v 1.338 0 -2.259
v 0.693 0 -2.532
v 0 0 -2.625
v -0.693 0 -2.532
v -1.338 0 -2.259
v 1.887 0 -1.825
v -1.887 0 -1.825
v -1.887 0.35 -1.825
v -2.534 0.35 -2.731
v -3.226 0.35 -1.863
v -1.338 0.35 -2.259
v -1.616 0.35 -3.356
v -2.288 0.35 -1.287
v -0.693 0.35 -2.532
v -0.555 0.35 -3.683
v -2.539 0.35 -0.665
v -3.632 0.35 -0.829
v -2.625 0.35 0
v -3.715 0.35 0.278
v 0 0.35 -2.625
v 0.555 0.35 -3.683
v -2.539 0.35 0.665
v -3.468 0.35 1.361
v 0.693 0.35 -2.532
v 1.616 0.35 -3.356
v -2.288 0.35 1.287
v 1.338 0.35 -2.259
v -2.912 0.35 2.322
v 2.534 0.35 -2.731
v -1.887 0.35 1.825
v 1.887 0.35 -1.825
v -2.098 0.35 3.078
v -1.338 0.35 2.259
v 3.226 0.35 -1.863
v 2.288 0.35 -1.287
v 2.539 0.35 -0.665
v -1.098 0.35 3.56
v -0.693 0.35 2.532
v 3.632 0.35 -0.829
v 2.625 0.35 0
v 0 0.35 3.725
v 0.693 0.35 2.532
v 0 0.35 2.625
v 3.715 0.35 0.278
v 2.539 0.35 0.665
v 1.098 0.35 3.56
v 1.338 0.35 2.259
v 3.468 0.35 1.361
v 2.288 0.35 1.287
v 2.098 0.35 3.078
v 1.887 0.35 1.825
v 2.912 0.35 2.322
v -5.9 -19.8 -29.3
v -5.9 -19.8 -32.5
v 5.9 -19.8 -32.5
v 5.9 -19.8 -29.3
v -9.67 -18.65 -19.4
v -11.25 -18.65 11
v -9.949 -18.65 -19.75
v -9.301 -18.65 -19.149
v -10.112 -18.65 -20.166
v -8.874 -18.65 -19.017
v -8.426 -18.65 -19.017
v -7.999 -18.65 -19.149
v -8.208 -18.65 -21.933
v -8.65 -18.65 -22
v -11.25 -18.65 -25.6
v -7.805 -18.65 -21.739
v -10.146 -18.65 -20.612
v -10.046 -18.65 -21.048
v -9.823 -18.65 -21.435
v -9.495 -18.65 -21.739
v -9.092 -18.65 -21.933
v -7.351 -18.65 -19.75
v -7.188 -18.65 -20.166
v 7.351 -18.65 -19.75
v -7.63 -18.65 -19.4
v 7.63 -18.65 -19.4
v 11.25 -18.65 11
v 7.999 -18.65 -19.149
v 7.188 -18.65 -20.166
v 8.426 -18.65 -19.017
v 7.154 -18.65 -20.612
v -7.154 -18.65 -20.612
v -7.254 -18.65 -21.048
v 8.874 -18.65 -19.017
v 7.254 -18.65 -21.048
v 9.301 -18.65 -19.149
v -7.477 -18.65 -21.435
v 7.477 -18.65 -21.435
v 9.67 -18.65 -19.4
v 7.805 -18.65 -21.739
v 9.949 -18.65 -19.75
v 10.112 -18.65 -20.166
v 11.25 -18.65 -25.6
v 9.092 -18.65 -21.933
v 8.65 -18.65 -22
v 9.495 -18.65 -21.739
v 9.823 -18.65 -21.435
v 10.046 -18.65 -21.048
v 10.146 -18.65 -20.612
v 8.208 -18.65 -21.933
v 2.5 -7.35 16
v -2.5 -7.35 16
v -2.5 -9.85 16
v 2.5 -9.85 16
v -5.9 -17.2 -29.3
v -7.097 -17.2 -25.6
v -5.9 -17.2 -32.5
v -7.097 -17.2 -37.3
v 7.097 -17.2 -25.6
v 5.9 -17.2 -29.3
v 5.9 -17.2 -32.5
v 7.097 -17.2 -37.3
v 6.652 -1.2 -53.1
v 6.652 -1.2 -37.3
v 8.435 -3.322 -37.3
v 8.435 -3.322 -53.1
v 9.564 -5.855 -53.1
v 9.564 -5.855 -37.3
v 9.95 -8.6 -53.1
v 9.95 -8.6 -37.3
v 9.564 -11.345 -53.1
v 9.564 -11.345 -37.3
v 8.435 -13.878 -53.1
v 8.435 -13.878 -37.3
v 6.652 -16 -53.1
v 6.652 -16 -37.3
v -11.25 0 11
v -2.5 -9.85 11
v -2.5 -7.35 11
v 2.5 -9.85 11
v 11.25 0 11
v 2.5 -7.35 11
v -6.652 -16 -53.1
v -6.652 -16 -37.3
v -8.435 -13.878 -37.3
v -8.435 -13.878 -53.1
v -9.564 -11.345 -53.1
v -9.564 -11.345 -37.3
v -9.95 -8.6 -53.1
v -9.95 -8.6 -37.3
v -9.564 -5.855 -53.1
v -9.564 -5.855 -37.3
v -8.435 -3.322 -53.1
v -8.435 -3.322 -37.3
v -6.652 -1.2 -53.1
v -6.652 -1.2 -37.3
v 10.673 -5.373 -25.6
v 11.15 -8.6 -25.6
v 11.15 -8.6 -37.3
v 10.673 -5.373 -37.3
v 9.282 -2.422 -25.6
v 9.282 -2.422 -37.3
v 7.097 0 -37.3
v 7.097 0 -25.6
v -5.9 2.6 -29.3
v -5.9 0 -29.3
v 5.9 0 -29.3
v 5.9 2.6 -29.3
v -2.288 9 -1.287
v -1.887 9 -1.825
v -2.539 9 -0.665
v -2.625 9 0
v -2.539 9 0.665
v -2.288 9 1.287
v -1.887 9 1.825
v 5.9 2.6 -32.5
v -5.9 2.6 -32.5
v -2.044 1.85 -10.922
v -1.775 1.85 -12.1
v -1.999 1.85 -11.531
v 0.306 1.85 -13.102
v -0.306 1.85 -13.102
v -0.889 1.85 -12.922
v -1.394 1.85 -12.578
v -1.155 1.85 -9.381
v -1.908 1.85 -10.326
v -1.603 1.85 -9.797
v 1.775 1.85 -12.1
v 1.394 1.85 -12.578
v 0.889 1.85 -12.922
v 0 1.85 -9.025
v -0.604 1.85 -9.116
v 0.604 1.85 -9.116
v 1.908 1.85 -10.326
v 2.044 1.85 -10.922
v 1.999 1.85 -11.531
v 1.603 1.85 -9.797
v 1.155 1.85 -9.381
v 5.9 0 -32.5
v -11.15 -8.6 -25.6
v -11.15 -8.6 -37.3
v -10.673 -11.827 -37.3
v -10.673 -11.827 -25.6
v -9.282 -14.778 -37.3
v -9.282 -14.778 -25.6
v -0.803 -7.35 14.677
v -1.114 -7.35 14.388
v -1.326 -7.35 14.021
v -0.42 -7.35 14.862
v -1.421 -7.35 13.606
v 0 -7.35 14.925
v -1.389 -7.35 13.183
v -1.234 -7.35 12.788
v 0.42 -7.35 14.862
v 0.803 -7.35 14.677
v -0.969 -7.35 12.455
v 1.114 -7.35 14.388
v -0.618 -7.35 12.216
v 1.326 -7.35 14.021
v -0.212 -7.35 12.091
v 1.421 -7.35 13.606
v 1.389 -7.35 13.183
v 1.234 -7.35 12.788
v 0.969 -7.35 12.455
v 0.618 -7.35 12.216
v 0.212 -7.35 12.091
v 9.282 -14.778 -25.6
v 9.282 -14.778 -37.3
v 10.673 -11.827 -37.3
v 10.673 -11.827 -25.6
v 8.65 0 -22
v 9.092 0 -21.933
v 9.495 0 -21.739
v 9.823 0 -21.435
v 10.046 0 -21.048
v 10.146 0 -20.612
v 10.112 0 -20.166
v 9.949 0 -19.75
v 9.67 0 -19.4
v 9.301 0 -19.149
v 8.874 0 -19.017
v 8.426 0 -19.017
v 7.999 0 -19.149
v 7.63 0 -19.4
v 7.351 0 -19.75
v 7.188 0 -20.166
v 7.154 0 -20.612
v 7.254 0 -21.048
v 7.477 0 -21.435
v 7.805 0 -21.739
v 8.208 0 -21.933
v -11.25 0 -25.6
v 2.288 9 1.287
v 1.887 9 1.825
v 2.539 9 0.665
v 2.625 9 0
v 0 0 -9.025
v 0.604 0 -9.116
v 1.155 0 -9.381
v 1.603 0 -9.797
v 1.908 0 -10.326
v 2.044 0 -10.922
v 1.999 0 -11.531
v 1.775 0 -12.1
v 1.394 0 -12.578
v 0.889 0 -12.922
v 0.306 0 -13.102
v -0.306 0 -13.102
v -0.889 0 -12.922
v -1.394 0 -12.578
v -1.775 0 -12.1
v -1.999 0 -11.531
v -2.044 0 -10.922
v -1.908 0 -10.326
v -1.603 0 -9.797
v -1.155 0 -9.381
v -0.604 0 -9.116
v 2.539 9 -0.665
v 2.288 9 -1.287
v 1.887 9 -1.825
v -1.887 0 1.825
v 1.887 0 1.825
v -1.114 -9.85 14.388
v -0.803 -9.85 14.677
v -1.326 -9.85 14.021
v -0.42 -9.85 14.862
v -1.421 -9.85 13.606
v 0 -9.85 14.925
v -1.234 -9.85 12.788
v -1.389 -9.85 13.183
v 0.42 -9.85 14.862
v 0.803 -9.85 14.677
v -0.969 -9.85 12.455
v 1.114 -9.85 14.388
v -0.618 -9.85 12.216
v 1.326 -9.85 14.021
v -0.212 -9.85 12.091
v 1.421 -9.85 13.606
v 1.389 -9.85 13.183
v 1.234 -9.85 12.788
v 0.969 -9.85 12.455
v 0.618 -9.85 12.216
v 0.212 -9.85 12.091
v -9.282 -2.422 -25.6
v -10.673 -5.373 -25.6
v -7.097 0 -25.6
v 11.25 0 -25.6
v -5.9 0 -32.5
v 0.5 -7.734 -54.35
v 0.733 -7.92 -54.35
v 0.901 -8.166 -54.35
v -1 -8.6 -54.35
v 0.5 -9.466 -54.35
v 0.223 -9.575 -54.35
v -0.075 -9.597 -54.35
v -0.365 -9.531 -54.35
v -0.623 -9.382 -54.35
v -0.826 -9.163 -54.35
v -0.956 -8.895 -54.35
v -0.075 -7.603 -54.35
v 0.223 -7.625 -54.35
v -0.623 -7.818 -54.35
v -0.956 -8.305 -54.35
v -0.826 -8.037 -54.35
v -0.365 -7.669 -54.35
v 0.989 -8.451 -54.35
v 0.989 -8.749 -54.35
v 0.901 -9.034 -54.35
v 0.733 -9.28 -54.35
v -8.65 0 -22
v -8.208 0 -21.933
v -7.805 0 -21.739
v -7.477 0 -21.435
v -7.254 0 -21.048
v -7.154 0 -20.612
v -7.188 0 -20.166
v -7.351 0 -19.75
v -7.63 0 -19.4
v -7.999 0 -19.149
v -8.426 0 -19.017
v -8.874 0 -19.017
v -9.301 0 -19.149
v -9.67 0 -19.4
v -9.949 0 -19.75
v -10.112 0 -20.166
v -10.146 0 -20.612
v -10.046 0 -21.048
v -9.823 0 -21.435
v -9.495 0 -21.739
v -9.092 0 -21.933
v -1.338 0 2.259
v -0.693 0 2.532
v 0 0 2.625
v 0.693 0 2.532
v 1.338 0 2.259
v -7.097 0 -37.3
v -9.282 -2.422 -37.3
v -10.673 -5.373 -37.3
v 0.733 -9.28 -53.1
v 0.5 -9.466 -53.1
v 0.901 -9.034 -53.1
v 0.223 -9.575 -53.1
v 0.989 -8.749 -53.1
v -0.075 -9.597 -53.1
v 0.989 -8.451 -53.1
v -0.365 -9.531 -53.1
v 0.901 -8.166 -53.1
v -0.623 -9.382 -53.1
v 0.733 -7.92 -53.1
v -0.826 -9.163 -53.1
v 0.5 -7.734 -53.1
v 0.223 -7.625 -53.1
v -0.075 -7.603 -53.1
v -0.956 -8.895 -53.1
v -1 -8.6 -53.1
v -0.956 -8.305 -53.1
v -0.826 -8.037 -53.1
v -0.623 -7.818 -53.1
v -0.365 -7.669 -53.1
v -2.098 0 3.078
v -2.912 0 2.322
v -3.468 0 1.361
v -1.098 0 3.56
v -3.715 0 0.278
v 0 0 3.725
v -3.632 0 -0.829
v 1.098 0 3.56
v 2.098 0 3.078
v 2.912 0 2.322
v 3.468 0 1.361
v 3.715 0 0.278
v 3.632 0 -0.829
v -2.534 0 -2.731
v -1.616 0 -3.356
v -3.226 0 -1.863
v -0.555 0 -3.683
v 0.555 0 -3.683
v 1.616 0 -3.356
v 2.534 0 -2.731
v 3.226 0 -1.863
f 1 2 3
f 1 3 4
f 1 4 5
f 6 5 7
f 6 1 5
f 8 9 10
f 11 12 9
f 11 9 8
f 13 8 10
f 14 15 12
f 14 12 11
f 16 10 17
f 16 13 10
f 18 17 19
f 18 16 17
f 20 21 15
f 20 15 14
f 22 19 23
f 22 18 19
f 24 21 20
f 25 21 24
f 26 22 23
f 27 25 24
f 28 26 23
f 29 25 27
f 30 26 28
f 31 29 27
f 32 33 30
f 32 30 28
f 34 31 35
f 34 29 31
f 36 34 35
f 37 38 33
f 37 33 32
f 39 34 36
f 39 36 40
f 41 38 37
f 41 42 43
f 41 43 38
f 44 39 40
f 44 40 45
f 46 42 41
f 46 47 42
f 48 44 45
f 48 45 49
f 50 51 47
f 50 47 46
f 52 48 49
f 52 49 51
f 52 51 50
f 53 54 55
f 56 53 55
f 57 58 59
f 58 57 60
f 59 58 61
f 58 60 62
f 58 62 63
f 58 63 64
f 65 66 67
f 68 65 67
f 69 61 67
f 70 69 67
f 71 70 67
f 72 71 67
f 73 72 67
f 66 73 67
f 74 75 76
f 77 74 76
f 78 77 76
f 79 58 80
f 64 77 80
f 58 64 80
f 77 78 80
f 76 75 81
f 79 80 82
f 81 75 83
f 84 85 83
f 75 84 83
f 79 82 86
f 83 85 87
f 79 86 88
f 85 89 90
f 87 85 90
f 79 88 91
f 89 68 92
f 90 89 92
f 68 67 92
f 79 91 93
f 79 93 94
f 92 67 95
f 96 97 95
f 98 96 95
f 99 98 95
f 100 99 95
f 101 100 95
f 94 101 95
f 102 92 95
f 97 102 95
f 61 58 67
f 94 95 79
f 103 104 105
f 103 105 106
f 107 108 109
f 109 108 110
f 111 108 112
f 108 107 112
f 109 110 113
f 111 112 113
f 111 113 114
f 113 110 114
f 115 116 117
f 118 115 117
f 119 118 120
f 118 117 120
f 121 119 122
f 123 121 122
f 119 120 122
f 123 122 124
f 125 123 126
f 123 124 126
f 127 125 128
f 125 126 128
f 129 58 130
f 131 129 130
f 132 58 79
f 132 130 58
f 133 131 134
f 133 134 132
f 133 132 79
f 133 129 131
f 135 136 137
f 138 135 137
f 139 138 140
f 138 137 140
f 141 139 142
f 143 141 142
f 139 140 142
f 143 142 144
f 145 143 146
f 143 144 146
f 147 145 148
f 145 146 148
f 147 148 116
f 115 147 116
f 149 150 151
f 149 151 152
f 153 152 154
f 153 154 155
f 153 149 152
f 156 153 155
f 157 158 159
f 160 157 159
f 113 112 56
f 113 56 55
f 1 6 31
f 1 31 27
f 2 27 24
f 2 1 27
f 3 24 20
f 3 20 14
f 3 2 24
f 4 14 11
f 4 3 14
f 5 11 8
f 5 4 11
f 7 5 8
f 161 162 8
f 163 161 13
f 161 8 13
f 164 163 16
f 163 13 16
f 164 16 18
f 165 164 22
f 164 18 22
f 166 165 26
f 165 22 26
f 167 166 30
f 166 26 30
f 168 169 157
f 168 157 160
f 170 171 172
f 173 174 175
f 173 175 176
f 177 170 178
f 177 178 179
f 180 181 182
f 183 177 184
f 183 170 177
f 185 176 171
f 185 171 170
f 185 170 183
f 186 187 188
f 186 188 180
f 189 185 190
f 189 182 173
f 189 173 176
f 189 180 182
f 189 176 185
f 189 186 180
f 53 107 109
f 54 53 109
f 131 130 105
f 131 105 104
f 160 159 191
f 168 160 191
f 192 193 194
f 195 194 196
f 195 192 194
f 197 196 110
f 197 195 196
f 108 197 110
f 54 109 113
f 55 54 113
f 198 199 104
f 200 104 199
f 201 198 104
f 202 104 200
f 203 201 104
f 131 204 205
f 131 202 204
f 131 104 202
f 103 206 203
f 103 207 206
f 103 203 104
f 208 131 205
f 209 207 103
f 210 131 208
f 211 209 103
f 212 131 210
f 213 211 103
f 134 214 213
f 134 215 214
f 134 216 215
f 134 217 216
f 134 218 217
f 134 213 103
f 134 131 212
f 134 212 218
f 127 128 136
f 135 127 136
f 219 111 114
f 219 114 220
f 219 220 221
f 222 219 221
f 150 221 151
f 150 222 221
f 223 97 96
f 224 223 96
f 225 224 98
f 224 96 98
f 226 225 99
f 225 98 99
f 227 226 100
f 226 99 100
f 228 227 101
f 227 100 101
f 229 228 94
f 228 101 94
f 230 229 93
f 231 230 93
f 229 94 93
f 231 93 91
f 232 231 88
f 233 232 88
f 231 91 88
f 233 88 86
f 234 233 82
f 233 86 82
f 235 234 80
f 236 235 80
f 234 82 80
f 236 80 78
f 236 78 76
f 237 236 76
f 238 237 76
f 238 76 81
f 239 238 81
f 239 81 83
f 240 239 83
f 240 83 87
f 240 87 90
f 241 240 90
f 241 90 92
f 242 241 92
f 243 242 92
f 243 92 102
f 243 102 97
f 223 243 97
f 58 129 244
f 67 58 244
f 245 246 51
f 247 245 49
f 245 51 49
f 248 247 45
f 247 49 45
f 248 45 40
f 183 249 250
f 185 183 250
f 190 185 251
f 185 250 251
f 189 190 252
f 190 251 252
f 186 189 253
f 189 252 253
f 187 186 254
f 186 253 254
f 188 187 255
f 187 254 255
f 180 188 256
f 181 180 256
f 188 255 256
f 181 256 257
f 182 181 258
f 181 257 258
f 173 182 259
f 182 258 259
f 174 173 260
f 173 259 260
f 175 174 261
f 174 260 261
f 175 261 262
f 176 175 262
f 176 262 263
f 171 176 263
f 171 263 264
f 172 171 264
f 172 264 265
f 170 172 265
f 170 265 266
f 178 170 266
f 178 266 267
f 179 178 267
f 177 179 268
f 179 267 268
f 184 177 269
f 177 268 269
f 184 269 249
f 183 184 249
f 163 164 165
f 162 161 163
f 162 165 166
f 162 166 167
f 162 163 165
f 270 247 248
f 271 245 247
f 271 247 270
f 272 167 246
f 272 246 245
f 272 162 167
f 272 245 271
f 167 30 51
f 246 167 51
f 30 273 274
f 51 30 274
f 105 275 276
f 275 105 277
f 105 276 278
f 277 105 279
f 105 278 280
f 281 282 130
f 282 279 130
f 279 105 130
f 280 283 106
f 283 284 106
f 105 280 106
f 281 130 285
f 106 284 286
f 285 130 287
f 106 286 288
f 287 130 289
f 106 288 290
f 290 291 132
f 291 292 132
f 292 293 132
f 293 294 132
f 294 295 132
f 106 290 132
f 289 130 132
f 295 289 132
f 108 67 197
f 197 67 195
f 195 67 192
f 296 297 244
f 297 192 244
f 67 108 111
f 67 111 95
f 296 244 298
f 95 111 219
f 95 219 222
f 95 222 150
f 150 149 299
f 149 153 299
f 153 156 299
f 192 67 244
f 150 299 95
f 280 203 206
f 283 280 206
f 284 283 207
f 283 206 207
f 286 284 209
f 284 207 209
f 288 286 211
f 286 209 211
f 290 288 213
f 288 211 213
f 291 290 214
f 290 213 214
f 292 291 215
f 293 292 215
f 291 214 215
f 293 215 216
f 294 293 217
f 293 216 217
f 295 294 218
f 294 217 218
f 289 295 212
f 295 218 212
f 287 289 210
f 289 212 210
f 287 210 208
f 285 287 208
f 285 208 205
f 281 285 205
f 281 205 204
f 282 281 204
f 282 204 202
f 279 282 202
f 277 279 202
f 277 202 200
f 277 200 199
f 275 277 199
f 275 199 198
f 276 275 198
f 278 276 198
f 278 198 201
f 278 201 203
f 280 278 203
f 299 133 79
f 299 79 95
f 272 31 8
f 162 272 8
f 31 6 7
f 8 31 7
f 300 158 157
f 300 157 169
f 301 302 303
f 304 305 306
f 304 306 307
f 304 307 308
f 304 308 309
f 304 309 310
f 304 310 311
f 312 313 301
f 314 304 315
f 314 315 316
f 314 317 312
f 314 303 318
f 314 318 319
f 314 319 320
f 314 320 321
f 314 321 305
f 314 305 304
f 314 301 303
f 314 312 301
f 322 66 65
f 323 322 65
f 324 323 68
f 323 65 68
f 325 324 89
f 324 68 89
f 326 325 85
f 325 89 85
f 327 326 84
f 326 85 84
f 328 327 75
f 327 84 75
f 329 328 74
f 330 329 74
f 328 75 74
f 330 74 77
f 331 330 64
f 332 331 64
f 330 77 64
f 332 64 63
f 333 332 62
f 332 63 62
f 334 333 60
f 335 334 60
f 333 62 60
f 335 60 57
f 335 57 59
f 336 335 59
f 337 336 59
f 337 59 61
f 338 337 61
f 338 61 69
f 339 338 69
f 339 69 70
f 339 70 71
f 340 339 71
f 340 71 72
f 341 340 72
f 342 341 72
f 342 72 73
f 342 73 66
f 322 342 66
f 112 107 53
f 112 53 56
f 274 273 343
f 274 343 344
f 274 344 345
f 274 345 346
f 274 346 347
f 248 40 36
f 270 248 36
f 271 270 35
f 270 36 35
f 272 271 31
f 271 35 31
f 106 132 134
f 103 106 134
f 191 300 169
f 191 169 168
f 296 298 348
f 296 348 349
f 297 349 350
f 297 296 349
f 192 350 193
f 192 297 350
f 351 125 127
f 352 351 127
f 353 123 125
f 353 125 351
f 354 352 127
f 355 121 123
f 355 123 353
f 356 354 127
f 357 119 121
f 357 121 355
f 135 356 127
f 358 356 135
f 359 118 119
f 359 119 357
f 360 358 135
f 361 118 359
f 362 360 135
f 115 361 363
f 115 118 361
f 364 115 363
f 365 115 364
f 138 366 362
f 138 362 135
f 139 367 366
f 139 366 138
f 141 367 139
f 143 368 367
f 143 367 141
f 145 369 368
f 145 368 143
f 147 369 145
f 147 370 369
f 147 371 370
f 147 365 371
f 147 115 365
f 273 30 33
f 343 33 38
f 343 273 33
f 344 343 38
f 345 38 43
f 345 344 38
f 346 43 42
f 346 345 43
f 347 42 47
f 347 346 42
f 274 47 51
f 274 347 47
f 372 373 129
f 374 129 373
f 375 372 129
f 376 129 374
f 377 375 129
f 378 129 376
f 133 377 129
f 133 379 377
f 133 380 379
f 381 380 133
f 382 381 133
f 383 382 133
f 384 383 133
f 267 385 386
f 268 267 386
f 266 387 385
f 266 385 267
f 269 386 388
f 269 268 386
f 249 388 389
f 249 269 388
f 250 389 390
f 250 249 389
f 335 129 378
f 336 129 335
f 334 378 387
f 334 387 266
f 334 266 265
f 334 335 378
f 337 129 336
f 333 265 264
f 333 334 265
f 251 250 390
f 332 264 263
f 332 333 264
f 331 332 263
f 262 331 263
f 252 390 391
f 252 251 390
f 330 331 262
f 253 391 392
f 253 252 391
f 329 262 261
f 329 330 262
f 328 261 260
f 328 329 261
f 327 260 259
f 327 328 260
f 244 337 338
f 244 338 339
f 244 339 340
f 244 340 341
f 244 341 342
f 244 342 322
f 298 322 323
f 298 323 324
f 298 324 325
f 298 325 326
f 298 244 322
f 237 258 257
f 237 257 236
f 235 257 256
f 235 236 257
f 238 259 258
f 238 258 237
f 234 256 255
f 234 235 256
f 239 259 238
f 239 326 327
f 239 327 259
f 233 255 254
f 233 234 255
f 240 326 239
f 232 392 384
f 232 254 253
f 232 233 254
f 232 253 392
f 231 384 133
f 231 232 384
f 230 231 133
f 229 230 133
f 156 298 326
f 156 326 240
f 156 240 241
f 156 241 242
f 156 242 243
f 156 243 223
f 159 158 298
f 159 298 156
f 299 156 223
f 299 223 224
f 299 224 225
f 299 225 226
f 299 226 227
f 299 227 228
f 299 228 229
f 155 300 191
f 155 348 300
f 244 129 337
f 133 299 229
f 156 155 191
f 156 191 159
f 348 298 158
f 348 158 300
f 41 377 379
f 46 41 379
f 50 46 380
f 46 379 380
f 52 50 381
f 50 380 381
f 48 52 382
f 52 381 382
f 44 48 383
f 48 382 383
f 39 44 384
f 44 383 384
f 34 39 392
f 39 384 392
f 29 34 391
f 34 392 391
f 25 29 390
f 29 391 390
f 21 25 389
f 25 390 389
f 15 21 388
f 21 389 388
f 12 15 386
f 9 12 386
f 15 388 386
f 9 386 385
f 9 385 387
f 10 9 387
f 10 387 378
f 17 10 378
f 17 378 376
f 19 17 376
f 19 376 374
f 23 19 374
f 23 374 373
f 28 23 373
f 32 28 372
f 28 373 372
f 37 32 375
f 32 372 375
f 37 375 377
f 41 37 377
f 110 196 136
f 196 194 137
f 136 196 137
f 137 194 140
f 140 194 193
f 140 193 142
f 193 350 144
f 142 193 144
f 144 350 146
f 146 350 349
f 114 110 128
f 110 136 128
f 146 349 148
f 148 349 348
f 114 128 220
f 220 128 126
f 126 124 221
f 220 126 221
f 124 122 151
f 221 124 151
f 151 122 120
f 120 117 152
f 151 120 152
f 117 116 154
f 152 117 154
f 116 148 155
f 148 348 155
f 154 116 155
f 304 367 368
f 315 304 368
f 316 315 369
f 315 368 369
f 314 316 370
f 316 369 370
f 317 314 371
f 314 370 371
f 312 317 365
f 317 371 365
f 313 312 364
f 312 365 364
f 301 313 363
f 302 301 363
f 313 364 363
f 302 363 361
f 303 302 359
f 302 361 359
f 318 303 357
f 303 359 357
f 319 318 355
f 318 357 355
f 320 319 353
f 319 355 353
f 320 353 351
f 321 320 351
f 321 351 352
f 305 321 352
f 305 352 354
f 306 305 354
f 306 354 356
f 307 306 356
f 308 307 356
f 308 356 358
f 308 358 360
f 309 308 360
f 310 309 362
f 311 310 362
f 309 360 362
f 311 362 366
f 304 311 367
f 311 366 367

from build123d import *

# Parameters (mm, degrees)
SKETCH1_W           = 22.5
SKETCH1_H           = 36.6
BOSS_EXTRUDE1_DEPTH = 18.65
SKETCH1_3_W         = 22.3
SKETCH1_3_H         = 11.7
BOSS_EXTRUDE2_DEPTH = 17.2
SKETCH1_4_W         = 11.8
SKETCH1_4_H         = 3.2
BOSS_EXTRUDE3_DEPTH = 2.6
CUT_EXTRUDE1_REACH  = 44.59
BOSS_EXTRUDE4_DEPTH = 15.8
SKETCH5_R           = 1
BOSS_EXTRUDE5_DEPTH = 1.25
SKETCH6_W           = 5
SKETCH6_H           = 2.5
BOSS_EXTRUDE6_DEPTH = 5
CUT_EXTRUDE2_REACH  = 58.881
SKETCH7_R           = 1.425
SKETCH1_5_R         = 3.725
SKETCH1_5_R_2       = 2.625
BOSS_EXTRUDE7_DEPTH = 0.35
SKETCH1_6_R         = 2.05
BOSS_EXTRUDE8_DEPTH = 1.85
BOSS_EXTRUDE9_DEPTH = 9
CUT_EXTRUDE3_REACH  = 64.008
SKETCH8_R           = 1.5


with BuildPart() as part:
    # Sketch1 → Boss-Extrude1 (new body)
    with BuildSketch(Plane(origin=(0, 0, 0), x_dir=(1, 0, 0), z_dir=(0, 1, 0))):
        with Locations((0, 7.3)):
            Rectangle(SKETCH1_W, SKETCH1_H)
    extrude(amount=-BOSS_EXTRUDE1_DEPTH)

    # Sketch1<3> → Boss-Extrude2 (add)
    with BuildSketch(Plane(origin=(0, 0, 0), x_dir=(1, 0, 0), z_dir=(0, 1, 0))):
        with Locations((0, 31.45)):
            Rectangle(SKETCH1_3_W, SKETCH1_3_H)
    extrude(amount=-BOSS_EXTRUDE2_DEPTH)

    # Sketch1<4> → Boss-Extrude3 (add)
    with BuildSketch(Plane(origin=(0, 0, 0), x_dir=(1, 0, 0), z_dir=(0, 1, 0))):
        with Locations((0, 30.9)):
            Rectangle(SKETCH1_4_W, SKETCH1_4_H)
    boss_extrude3 = extrude(amount=BOSS_EXTRUDE3_DEPTH)

    # Sketch3 → Cut-Extrude1 (cut, up to next)
    with BuildSketch(Plane(origin=(0, 0, -25.6), x_dir=(-1, 0, 0), z_dir=(0, 0, -1)), mode=Mode.PRIVATE) as cut_extrude1_sk1:
        with BuildLine():
            ThreePointArc((11.15, -8.600000119), (10.085885996, -13.353672651), (7.096654141, -17.2))
            Line((7.096654141, -17.2), (11.15, -17.2))
            Line((11.15, -17.2), (11.15, -8.600000119))
        make_face()
    cut_extrude1_tool1 = extrude(cut_extrude1_sk1.sketch, amount=CUT_EXTRUDE1_REACH, mode=Mode.PRIVATE) & part.part
    # Sketch3 → Cut-Extrude1 (cut, up to next)
    with BuildSketch(Plane(origin=(0, 0, -25.6), x_dir=(-1, 0, 0), z_dir=(0, 0, -1)), mode=Mode.PRIVATE) as cut_extrude1_sk2:
        with BuildLine():
            Line((-11.15, -17.2), (-7.096654141, -17.2))
            ThreePointArc((-7.096654141, -17.2), (-10.085886021, -13.353672597), (-11.15, -8.6))
            Line((-11.15, -8.6), (-11.15, -17.2))
        make_face()
    cut_extrude1_tool2 = extrude(cut_extrude1_sk2.sketch, amount=CUT_EXTRUDE1_REACH, mode=Mode.PRIVATE) & part.part
    # Sketch3 → Cut-Extrude1 (cut, up to next)
    with BuildSketch(Plane(origin=(0, 0, -25.6), x_dir=(-1, 0, 0), z_dir=(0, 0, -1)), mode=Mode.PRIVATE) as cut_extrude1_sk3:
        with BuildLine():
            ThreePointArc((7.096654141, 0), (10.085886047, -3.846327457), (11.15, -8.600000119))
            Line((11.15, -8.600000119), (11.15, 0))
            Line((11.15, 0), (7.096654141, 0))
        make_face()
    cut_extrude1_tool3 = extrude(cut_extrude1_sk3.sketch, amount=CUT_EXTRUDE1_REACH, mode=Mode.PRIVATE) & part.part
    # Sketch3 → Cut-Extrude1 (cut, up to next)
    with BuildSketch(Plane(origin=(0, 0, -25.6), x_dir=(-1, 0, 0), z_dir=(0, 0, -1)), mode=Mode.PRIVATE) as cut_extrude1_sk4:
        with BuildLine():
            Line((-11.15, 0), (-11.15, -8.6))
            ThreePointArc((-11.15, -8.6), (-10.085886021, -3.846327403), (-7.096654141, 0))
            Line((-7.096654141, 0), (-11.15, 0))
        make_face()
    cut_extrude1_tool4 = extrude(cut_extrude1_sk4.sketch, amount=CUT_EXTRUDE1_REACH, mode=Mode.PRIVATE) & part.part
    add(cut_extrude1_tool1.solids().sort_by_distance((-9.984236, -15.135971, -25.6))[0], mode=Mode.SUBTRACT)
    add(cut_extrude1_tool2.solids().sort_by_distance((9.984236, -15.135971, -25.6))[0], mode=Mode.SUBTRACT)
    add(cut_extrude1_tool3.solids().sort_by_distance((-9.984236, -2.064029, -25.6))[0], mode=Mode.SUBTRACT)
    add(cut_extrude1_tool4.solids().sort_by_distance((9.984236, -2.064029, -25.6))[0], mode=Mode.SUBTRACT)

    # Sketch4 → Boss-Extrude4 (add)
    with BuildSketch(Plane(origin=(0, 0, -37.3), x_dir=(-1, 0, 0), z_dir=(0, 0, -1))):
        with BuildLine():
            Line((6.651503589, -1.2), (-6.651503589, -1.2))
            ThreePointArc((-6.651503589, -1.2), (-9.95, -8.6), (-6.651503589, -16))
            Line((-6.651503589, -16), (6.651503589, -16))
            ThreePointArc((6.651503589, -16), (9.95, -8.6), (6.651503589, -1.2))
        make_face()
    extrude(amount=BOSS_EXTRUDE4_DEPTH)

    # Sketch5 → Boss-Extrude5 (add)
    with BuildSketch(Plane(origin=(0, 0, -53.1), x_dir=(-1, 0, 0), z_dir=(0, 0, -1))):
        with Locations((0, -8.6)):
            Circle(SKETCH5_R)
    extrude(amount=BOSS_EXTRUDE5_DEPTH)

    # Mirror1: Boss-Extrude3 across plane
    add(boss_extrude3.mirror(Plane.ZX.offset(-8.6)))

    # Sketch6 → Boss-Extrude6 (add)
    with BuildSketch(Plane.XY.offset(11)):
        with Locations((0, -8.6)):
            Rectangle(SKETCH6_W, SKETCH6_H)
    extrude(amount=BOSS_EXTRUDE6_DEPTH)

    # Sketch7 → Cut-Extrude2 (cut, up to next)
    with BuildSketch(Plane(origin=(0, -7.35, 0), x_dir=(1, 0, 0), z_dir=(0, 1, 0)), mode=Mode.PRIVATE) as cut_extrude2_sk1:
        with Locations(Location((0, -13.5, 0), (0, 0, 270))):
            Circle(SKETCH7_R)
    cut_extrude2_tool1 = extrude(cut_extrude2_sk1.sketch, amount=-CUT_EXTRUDE2_REACH, mode=Mode.PRIVATE) & part.part
    add(cut_extrude2_tool1.solids().sort_by_distance((0, -7.35, 13.5))[0], mode=Mode.SUBTRACT)

    # Sketch1<5> → Boss-Extrude7 (add)
    with BuildSketch(Plane(origin=(0, 0, 0), x_dir=(1, 0, 0), z_dir=(0, 1, 0))):
        with Locations(Location((0, 0, 0), (0, 0, 270))):
            Circle(SKETCH1_5_R)
        with Locations(Location((0, 0, 0), (0, 0, 270))):
            Circle(SKETCH1_5_R_2, mode=Mode.SUBTRACT)
    extrude(amount=BOSS_EXTRUDE7_DEPTH)

    # Sketch1<6> → Boss-Extrude8 (add)
    with BuildSketch(Plane(origin=(0, 0, 0), x_dir=(1, 0, 0), z_dir=(0, 1, 0))):
        with Locations(Location((0, 11.075, 0), (0, 0, 270))):
            Circle(SKETCH1_6_R)
    extrude(amount=BOSS_EXTRUDE8_DEPTH)

    # Sketch1<7> → Boss-Extrude9 (add)
    with BuildSketch(Plane(origin=(0, 0, 0), x_dir=(1, 0, 0), z_dir=(0, 1, 0))):
        with BuildLine():
            ThreePointArc((-1.886796226, 1.825), (-2.625, 0), (-1.886796226, -1.825))
            Line((-1.886796226, -1.825), (1.886796226, -1.825))
            ThreePointArc((1.886796226, -1.825), (2.433461022, -0.984323348), (2.625, 0))
            ThreePointArc((2.625, 0), (2.433461022, 0.984323348), (1.886796226, 1.825))
            Line((1.886796226, 1.825), (-1.886796226, 1.825))
        make_face()
    extrude(amount=BOSS_EXTRUDE9_DEPTH)

    # Sketch8 → Cut-Extrude3 (cut, up to next)
    with BuildSketch(Plane.XZ.offset(18.65), mode=Mode.PRIVATE) as cut_extrude3_sk1:
        with Locations(Location((8.65, -20.5, 0), (0, 0, 270))):
            Circle(SKETCH8_R)
    cut_extrude3_tool1 = extrude(cut_extrude3_sk1.sketch, amount=-CUT_EXTRUDE3_REACH, mode=Mode.PRIVATE) & part.part
    # Sketch8 → Cut-Extrude3 (cut, up to next)
    with BuildSketch(Plane.XZ.offset(18.65), mode=Mode.PRIVATE) as cut_extrude3_sk2:
        with Locations(Location((-8.65, -20.5, 0), (0, 0, 270))):
            Circle(SKETCH8_R)
    cut_extrude3_tool2 = extrude(cut_extrude3_sk2.sketch, amount=-CUT_EXTRUDE3_REACH, mode=Mode.PRIVATE) & part.part
    add(cut_extrude3_tool1.solids().sort_by_distance((8.65, -18.65, -20.5))[0], mode=Mode.SUBTRACT)
    add(cut_extrude3_tool2.solids().sort_by_distance((-8.65, -18.65, -20.5))[0], mode=Mode.SUBTRACT)


solid = part.part
